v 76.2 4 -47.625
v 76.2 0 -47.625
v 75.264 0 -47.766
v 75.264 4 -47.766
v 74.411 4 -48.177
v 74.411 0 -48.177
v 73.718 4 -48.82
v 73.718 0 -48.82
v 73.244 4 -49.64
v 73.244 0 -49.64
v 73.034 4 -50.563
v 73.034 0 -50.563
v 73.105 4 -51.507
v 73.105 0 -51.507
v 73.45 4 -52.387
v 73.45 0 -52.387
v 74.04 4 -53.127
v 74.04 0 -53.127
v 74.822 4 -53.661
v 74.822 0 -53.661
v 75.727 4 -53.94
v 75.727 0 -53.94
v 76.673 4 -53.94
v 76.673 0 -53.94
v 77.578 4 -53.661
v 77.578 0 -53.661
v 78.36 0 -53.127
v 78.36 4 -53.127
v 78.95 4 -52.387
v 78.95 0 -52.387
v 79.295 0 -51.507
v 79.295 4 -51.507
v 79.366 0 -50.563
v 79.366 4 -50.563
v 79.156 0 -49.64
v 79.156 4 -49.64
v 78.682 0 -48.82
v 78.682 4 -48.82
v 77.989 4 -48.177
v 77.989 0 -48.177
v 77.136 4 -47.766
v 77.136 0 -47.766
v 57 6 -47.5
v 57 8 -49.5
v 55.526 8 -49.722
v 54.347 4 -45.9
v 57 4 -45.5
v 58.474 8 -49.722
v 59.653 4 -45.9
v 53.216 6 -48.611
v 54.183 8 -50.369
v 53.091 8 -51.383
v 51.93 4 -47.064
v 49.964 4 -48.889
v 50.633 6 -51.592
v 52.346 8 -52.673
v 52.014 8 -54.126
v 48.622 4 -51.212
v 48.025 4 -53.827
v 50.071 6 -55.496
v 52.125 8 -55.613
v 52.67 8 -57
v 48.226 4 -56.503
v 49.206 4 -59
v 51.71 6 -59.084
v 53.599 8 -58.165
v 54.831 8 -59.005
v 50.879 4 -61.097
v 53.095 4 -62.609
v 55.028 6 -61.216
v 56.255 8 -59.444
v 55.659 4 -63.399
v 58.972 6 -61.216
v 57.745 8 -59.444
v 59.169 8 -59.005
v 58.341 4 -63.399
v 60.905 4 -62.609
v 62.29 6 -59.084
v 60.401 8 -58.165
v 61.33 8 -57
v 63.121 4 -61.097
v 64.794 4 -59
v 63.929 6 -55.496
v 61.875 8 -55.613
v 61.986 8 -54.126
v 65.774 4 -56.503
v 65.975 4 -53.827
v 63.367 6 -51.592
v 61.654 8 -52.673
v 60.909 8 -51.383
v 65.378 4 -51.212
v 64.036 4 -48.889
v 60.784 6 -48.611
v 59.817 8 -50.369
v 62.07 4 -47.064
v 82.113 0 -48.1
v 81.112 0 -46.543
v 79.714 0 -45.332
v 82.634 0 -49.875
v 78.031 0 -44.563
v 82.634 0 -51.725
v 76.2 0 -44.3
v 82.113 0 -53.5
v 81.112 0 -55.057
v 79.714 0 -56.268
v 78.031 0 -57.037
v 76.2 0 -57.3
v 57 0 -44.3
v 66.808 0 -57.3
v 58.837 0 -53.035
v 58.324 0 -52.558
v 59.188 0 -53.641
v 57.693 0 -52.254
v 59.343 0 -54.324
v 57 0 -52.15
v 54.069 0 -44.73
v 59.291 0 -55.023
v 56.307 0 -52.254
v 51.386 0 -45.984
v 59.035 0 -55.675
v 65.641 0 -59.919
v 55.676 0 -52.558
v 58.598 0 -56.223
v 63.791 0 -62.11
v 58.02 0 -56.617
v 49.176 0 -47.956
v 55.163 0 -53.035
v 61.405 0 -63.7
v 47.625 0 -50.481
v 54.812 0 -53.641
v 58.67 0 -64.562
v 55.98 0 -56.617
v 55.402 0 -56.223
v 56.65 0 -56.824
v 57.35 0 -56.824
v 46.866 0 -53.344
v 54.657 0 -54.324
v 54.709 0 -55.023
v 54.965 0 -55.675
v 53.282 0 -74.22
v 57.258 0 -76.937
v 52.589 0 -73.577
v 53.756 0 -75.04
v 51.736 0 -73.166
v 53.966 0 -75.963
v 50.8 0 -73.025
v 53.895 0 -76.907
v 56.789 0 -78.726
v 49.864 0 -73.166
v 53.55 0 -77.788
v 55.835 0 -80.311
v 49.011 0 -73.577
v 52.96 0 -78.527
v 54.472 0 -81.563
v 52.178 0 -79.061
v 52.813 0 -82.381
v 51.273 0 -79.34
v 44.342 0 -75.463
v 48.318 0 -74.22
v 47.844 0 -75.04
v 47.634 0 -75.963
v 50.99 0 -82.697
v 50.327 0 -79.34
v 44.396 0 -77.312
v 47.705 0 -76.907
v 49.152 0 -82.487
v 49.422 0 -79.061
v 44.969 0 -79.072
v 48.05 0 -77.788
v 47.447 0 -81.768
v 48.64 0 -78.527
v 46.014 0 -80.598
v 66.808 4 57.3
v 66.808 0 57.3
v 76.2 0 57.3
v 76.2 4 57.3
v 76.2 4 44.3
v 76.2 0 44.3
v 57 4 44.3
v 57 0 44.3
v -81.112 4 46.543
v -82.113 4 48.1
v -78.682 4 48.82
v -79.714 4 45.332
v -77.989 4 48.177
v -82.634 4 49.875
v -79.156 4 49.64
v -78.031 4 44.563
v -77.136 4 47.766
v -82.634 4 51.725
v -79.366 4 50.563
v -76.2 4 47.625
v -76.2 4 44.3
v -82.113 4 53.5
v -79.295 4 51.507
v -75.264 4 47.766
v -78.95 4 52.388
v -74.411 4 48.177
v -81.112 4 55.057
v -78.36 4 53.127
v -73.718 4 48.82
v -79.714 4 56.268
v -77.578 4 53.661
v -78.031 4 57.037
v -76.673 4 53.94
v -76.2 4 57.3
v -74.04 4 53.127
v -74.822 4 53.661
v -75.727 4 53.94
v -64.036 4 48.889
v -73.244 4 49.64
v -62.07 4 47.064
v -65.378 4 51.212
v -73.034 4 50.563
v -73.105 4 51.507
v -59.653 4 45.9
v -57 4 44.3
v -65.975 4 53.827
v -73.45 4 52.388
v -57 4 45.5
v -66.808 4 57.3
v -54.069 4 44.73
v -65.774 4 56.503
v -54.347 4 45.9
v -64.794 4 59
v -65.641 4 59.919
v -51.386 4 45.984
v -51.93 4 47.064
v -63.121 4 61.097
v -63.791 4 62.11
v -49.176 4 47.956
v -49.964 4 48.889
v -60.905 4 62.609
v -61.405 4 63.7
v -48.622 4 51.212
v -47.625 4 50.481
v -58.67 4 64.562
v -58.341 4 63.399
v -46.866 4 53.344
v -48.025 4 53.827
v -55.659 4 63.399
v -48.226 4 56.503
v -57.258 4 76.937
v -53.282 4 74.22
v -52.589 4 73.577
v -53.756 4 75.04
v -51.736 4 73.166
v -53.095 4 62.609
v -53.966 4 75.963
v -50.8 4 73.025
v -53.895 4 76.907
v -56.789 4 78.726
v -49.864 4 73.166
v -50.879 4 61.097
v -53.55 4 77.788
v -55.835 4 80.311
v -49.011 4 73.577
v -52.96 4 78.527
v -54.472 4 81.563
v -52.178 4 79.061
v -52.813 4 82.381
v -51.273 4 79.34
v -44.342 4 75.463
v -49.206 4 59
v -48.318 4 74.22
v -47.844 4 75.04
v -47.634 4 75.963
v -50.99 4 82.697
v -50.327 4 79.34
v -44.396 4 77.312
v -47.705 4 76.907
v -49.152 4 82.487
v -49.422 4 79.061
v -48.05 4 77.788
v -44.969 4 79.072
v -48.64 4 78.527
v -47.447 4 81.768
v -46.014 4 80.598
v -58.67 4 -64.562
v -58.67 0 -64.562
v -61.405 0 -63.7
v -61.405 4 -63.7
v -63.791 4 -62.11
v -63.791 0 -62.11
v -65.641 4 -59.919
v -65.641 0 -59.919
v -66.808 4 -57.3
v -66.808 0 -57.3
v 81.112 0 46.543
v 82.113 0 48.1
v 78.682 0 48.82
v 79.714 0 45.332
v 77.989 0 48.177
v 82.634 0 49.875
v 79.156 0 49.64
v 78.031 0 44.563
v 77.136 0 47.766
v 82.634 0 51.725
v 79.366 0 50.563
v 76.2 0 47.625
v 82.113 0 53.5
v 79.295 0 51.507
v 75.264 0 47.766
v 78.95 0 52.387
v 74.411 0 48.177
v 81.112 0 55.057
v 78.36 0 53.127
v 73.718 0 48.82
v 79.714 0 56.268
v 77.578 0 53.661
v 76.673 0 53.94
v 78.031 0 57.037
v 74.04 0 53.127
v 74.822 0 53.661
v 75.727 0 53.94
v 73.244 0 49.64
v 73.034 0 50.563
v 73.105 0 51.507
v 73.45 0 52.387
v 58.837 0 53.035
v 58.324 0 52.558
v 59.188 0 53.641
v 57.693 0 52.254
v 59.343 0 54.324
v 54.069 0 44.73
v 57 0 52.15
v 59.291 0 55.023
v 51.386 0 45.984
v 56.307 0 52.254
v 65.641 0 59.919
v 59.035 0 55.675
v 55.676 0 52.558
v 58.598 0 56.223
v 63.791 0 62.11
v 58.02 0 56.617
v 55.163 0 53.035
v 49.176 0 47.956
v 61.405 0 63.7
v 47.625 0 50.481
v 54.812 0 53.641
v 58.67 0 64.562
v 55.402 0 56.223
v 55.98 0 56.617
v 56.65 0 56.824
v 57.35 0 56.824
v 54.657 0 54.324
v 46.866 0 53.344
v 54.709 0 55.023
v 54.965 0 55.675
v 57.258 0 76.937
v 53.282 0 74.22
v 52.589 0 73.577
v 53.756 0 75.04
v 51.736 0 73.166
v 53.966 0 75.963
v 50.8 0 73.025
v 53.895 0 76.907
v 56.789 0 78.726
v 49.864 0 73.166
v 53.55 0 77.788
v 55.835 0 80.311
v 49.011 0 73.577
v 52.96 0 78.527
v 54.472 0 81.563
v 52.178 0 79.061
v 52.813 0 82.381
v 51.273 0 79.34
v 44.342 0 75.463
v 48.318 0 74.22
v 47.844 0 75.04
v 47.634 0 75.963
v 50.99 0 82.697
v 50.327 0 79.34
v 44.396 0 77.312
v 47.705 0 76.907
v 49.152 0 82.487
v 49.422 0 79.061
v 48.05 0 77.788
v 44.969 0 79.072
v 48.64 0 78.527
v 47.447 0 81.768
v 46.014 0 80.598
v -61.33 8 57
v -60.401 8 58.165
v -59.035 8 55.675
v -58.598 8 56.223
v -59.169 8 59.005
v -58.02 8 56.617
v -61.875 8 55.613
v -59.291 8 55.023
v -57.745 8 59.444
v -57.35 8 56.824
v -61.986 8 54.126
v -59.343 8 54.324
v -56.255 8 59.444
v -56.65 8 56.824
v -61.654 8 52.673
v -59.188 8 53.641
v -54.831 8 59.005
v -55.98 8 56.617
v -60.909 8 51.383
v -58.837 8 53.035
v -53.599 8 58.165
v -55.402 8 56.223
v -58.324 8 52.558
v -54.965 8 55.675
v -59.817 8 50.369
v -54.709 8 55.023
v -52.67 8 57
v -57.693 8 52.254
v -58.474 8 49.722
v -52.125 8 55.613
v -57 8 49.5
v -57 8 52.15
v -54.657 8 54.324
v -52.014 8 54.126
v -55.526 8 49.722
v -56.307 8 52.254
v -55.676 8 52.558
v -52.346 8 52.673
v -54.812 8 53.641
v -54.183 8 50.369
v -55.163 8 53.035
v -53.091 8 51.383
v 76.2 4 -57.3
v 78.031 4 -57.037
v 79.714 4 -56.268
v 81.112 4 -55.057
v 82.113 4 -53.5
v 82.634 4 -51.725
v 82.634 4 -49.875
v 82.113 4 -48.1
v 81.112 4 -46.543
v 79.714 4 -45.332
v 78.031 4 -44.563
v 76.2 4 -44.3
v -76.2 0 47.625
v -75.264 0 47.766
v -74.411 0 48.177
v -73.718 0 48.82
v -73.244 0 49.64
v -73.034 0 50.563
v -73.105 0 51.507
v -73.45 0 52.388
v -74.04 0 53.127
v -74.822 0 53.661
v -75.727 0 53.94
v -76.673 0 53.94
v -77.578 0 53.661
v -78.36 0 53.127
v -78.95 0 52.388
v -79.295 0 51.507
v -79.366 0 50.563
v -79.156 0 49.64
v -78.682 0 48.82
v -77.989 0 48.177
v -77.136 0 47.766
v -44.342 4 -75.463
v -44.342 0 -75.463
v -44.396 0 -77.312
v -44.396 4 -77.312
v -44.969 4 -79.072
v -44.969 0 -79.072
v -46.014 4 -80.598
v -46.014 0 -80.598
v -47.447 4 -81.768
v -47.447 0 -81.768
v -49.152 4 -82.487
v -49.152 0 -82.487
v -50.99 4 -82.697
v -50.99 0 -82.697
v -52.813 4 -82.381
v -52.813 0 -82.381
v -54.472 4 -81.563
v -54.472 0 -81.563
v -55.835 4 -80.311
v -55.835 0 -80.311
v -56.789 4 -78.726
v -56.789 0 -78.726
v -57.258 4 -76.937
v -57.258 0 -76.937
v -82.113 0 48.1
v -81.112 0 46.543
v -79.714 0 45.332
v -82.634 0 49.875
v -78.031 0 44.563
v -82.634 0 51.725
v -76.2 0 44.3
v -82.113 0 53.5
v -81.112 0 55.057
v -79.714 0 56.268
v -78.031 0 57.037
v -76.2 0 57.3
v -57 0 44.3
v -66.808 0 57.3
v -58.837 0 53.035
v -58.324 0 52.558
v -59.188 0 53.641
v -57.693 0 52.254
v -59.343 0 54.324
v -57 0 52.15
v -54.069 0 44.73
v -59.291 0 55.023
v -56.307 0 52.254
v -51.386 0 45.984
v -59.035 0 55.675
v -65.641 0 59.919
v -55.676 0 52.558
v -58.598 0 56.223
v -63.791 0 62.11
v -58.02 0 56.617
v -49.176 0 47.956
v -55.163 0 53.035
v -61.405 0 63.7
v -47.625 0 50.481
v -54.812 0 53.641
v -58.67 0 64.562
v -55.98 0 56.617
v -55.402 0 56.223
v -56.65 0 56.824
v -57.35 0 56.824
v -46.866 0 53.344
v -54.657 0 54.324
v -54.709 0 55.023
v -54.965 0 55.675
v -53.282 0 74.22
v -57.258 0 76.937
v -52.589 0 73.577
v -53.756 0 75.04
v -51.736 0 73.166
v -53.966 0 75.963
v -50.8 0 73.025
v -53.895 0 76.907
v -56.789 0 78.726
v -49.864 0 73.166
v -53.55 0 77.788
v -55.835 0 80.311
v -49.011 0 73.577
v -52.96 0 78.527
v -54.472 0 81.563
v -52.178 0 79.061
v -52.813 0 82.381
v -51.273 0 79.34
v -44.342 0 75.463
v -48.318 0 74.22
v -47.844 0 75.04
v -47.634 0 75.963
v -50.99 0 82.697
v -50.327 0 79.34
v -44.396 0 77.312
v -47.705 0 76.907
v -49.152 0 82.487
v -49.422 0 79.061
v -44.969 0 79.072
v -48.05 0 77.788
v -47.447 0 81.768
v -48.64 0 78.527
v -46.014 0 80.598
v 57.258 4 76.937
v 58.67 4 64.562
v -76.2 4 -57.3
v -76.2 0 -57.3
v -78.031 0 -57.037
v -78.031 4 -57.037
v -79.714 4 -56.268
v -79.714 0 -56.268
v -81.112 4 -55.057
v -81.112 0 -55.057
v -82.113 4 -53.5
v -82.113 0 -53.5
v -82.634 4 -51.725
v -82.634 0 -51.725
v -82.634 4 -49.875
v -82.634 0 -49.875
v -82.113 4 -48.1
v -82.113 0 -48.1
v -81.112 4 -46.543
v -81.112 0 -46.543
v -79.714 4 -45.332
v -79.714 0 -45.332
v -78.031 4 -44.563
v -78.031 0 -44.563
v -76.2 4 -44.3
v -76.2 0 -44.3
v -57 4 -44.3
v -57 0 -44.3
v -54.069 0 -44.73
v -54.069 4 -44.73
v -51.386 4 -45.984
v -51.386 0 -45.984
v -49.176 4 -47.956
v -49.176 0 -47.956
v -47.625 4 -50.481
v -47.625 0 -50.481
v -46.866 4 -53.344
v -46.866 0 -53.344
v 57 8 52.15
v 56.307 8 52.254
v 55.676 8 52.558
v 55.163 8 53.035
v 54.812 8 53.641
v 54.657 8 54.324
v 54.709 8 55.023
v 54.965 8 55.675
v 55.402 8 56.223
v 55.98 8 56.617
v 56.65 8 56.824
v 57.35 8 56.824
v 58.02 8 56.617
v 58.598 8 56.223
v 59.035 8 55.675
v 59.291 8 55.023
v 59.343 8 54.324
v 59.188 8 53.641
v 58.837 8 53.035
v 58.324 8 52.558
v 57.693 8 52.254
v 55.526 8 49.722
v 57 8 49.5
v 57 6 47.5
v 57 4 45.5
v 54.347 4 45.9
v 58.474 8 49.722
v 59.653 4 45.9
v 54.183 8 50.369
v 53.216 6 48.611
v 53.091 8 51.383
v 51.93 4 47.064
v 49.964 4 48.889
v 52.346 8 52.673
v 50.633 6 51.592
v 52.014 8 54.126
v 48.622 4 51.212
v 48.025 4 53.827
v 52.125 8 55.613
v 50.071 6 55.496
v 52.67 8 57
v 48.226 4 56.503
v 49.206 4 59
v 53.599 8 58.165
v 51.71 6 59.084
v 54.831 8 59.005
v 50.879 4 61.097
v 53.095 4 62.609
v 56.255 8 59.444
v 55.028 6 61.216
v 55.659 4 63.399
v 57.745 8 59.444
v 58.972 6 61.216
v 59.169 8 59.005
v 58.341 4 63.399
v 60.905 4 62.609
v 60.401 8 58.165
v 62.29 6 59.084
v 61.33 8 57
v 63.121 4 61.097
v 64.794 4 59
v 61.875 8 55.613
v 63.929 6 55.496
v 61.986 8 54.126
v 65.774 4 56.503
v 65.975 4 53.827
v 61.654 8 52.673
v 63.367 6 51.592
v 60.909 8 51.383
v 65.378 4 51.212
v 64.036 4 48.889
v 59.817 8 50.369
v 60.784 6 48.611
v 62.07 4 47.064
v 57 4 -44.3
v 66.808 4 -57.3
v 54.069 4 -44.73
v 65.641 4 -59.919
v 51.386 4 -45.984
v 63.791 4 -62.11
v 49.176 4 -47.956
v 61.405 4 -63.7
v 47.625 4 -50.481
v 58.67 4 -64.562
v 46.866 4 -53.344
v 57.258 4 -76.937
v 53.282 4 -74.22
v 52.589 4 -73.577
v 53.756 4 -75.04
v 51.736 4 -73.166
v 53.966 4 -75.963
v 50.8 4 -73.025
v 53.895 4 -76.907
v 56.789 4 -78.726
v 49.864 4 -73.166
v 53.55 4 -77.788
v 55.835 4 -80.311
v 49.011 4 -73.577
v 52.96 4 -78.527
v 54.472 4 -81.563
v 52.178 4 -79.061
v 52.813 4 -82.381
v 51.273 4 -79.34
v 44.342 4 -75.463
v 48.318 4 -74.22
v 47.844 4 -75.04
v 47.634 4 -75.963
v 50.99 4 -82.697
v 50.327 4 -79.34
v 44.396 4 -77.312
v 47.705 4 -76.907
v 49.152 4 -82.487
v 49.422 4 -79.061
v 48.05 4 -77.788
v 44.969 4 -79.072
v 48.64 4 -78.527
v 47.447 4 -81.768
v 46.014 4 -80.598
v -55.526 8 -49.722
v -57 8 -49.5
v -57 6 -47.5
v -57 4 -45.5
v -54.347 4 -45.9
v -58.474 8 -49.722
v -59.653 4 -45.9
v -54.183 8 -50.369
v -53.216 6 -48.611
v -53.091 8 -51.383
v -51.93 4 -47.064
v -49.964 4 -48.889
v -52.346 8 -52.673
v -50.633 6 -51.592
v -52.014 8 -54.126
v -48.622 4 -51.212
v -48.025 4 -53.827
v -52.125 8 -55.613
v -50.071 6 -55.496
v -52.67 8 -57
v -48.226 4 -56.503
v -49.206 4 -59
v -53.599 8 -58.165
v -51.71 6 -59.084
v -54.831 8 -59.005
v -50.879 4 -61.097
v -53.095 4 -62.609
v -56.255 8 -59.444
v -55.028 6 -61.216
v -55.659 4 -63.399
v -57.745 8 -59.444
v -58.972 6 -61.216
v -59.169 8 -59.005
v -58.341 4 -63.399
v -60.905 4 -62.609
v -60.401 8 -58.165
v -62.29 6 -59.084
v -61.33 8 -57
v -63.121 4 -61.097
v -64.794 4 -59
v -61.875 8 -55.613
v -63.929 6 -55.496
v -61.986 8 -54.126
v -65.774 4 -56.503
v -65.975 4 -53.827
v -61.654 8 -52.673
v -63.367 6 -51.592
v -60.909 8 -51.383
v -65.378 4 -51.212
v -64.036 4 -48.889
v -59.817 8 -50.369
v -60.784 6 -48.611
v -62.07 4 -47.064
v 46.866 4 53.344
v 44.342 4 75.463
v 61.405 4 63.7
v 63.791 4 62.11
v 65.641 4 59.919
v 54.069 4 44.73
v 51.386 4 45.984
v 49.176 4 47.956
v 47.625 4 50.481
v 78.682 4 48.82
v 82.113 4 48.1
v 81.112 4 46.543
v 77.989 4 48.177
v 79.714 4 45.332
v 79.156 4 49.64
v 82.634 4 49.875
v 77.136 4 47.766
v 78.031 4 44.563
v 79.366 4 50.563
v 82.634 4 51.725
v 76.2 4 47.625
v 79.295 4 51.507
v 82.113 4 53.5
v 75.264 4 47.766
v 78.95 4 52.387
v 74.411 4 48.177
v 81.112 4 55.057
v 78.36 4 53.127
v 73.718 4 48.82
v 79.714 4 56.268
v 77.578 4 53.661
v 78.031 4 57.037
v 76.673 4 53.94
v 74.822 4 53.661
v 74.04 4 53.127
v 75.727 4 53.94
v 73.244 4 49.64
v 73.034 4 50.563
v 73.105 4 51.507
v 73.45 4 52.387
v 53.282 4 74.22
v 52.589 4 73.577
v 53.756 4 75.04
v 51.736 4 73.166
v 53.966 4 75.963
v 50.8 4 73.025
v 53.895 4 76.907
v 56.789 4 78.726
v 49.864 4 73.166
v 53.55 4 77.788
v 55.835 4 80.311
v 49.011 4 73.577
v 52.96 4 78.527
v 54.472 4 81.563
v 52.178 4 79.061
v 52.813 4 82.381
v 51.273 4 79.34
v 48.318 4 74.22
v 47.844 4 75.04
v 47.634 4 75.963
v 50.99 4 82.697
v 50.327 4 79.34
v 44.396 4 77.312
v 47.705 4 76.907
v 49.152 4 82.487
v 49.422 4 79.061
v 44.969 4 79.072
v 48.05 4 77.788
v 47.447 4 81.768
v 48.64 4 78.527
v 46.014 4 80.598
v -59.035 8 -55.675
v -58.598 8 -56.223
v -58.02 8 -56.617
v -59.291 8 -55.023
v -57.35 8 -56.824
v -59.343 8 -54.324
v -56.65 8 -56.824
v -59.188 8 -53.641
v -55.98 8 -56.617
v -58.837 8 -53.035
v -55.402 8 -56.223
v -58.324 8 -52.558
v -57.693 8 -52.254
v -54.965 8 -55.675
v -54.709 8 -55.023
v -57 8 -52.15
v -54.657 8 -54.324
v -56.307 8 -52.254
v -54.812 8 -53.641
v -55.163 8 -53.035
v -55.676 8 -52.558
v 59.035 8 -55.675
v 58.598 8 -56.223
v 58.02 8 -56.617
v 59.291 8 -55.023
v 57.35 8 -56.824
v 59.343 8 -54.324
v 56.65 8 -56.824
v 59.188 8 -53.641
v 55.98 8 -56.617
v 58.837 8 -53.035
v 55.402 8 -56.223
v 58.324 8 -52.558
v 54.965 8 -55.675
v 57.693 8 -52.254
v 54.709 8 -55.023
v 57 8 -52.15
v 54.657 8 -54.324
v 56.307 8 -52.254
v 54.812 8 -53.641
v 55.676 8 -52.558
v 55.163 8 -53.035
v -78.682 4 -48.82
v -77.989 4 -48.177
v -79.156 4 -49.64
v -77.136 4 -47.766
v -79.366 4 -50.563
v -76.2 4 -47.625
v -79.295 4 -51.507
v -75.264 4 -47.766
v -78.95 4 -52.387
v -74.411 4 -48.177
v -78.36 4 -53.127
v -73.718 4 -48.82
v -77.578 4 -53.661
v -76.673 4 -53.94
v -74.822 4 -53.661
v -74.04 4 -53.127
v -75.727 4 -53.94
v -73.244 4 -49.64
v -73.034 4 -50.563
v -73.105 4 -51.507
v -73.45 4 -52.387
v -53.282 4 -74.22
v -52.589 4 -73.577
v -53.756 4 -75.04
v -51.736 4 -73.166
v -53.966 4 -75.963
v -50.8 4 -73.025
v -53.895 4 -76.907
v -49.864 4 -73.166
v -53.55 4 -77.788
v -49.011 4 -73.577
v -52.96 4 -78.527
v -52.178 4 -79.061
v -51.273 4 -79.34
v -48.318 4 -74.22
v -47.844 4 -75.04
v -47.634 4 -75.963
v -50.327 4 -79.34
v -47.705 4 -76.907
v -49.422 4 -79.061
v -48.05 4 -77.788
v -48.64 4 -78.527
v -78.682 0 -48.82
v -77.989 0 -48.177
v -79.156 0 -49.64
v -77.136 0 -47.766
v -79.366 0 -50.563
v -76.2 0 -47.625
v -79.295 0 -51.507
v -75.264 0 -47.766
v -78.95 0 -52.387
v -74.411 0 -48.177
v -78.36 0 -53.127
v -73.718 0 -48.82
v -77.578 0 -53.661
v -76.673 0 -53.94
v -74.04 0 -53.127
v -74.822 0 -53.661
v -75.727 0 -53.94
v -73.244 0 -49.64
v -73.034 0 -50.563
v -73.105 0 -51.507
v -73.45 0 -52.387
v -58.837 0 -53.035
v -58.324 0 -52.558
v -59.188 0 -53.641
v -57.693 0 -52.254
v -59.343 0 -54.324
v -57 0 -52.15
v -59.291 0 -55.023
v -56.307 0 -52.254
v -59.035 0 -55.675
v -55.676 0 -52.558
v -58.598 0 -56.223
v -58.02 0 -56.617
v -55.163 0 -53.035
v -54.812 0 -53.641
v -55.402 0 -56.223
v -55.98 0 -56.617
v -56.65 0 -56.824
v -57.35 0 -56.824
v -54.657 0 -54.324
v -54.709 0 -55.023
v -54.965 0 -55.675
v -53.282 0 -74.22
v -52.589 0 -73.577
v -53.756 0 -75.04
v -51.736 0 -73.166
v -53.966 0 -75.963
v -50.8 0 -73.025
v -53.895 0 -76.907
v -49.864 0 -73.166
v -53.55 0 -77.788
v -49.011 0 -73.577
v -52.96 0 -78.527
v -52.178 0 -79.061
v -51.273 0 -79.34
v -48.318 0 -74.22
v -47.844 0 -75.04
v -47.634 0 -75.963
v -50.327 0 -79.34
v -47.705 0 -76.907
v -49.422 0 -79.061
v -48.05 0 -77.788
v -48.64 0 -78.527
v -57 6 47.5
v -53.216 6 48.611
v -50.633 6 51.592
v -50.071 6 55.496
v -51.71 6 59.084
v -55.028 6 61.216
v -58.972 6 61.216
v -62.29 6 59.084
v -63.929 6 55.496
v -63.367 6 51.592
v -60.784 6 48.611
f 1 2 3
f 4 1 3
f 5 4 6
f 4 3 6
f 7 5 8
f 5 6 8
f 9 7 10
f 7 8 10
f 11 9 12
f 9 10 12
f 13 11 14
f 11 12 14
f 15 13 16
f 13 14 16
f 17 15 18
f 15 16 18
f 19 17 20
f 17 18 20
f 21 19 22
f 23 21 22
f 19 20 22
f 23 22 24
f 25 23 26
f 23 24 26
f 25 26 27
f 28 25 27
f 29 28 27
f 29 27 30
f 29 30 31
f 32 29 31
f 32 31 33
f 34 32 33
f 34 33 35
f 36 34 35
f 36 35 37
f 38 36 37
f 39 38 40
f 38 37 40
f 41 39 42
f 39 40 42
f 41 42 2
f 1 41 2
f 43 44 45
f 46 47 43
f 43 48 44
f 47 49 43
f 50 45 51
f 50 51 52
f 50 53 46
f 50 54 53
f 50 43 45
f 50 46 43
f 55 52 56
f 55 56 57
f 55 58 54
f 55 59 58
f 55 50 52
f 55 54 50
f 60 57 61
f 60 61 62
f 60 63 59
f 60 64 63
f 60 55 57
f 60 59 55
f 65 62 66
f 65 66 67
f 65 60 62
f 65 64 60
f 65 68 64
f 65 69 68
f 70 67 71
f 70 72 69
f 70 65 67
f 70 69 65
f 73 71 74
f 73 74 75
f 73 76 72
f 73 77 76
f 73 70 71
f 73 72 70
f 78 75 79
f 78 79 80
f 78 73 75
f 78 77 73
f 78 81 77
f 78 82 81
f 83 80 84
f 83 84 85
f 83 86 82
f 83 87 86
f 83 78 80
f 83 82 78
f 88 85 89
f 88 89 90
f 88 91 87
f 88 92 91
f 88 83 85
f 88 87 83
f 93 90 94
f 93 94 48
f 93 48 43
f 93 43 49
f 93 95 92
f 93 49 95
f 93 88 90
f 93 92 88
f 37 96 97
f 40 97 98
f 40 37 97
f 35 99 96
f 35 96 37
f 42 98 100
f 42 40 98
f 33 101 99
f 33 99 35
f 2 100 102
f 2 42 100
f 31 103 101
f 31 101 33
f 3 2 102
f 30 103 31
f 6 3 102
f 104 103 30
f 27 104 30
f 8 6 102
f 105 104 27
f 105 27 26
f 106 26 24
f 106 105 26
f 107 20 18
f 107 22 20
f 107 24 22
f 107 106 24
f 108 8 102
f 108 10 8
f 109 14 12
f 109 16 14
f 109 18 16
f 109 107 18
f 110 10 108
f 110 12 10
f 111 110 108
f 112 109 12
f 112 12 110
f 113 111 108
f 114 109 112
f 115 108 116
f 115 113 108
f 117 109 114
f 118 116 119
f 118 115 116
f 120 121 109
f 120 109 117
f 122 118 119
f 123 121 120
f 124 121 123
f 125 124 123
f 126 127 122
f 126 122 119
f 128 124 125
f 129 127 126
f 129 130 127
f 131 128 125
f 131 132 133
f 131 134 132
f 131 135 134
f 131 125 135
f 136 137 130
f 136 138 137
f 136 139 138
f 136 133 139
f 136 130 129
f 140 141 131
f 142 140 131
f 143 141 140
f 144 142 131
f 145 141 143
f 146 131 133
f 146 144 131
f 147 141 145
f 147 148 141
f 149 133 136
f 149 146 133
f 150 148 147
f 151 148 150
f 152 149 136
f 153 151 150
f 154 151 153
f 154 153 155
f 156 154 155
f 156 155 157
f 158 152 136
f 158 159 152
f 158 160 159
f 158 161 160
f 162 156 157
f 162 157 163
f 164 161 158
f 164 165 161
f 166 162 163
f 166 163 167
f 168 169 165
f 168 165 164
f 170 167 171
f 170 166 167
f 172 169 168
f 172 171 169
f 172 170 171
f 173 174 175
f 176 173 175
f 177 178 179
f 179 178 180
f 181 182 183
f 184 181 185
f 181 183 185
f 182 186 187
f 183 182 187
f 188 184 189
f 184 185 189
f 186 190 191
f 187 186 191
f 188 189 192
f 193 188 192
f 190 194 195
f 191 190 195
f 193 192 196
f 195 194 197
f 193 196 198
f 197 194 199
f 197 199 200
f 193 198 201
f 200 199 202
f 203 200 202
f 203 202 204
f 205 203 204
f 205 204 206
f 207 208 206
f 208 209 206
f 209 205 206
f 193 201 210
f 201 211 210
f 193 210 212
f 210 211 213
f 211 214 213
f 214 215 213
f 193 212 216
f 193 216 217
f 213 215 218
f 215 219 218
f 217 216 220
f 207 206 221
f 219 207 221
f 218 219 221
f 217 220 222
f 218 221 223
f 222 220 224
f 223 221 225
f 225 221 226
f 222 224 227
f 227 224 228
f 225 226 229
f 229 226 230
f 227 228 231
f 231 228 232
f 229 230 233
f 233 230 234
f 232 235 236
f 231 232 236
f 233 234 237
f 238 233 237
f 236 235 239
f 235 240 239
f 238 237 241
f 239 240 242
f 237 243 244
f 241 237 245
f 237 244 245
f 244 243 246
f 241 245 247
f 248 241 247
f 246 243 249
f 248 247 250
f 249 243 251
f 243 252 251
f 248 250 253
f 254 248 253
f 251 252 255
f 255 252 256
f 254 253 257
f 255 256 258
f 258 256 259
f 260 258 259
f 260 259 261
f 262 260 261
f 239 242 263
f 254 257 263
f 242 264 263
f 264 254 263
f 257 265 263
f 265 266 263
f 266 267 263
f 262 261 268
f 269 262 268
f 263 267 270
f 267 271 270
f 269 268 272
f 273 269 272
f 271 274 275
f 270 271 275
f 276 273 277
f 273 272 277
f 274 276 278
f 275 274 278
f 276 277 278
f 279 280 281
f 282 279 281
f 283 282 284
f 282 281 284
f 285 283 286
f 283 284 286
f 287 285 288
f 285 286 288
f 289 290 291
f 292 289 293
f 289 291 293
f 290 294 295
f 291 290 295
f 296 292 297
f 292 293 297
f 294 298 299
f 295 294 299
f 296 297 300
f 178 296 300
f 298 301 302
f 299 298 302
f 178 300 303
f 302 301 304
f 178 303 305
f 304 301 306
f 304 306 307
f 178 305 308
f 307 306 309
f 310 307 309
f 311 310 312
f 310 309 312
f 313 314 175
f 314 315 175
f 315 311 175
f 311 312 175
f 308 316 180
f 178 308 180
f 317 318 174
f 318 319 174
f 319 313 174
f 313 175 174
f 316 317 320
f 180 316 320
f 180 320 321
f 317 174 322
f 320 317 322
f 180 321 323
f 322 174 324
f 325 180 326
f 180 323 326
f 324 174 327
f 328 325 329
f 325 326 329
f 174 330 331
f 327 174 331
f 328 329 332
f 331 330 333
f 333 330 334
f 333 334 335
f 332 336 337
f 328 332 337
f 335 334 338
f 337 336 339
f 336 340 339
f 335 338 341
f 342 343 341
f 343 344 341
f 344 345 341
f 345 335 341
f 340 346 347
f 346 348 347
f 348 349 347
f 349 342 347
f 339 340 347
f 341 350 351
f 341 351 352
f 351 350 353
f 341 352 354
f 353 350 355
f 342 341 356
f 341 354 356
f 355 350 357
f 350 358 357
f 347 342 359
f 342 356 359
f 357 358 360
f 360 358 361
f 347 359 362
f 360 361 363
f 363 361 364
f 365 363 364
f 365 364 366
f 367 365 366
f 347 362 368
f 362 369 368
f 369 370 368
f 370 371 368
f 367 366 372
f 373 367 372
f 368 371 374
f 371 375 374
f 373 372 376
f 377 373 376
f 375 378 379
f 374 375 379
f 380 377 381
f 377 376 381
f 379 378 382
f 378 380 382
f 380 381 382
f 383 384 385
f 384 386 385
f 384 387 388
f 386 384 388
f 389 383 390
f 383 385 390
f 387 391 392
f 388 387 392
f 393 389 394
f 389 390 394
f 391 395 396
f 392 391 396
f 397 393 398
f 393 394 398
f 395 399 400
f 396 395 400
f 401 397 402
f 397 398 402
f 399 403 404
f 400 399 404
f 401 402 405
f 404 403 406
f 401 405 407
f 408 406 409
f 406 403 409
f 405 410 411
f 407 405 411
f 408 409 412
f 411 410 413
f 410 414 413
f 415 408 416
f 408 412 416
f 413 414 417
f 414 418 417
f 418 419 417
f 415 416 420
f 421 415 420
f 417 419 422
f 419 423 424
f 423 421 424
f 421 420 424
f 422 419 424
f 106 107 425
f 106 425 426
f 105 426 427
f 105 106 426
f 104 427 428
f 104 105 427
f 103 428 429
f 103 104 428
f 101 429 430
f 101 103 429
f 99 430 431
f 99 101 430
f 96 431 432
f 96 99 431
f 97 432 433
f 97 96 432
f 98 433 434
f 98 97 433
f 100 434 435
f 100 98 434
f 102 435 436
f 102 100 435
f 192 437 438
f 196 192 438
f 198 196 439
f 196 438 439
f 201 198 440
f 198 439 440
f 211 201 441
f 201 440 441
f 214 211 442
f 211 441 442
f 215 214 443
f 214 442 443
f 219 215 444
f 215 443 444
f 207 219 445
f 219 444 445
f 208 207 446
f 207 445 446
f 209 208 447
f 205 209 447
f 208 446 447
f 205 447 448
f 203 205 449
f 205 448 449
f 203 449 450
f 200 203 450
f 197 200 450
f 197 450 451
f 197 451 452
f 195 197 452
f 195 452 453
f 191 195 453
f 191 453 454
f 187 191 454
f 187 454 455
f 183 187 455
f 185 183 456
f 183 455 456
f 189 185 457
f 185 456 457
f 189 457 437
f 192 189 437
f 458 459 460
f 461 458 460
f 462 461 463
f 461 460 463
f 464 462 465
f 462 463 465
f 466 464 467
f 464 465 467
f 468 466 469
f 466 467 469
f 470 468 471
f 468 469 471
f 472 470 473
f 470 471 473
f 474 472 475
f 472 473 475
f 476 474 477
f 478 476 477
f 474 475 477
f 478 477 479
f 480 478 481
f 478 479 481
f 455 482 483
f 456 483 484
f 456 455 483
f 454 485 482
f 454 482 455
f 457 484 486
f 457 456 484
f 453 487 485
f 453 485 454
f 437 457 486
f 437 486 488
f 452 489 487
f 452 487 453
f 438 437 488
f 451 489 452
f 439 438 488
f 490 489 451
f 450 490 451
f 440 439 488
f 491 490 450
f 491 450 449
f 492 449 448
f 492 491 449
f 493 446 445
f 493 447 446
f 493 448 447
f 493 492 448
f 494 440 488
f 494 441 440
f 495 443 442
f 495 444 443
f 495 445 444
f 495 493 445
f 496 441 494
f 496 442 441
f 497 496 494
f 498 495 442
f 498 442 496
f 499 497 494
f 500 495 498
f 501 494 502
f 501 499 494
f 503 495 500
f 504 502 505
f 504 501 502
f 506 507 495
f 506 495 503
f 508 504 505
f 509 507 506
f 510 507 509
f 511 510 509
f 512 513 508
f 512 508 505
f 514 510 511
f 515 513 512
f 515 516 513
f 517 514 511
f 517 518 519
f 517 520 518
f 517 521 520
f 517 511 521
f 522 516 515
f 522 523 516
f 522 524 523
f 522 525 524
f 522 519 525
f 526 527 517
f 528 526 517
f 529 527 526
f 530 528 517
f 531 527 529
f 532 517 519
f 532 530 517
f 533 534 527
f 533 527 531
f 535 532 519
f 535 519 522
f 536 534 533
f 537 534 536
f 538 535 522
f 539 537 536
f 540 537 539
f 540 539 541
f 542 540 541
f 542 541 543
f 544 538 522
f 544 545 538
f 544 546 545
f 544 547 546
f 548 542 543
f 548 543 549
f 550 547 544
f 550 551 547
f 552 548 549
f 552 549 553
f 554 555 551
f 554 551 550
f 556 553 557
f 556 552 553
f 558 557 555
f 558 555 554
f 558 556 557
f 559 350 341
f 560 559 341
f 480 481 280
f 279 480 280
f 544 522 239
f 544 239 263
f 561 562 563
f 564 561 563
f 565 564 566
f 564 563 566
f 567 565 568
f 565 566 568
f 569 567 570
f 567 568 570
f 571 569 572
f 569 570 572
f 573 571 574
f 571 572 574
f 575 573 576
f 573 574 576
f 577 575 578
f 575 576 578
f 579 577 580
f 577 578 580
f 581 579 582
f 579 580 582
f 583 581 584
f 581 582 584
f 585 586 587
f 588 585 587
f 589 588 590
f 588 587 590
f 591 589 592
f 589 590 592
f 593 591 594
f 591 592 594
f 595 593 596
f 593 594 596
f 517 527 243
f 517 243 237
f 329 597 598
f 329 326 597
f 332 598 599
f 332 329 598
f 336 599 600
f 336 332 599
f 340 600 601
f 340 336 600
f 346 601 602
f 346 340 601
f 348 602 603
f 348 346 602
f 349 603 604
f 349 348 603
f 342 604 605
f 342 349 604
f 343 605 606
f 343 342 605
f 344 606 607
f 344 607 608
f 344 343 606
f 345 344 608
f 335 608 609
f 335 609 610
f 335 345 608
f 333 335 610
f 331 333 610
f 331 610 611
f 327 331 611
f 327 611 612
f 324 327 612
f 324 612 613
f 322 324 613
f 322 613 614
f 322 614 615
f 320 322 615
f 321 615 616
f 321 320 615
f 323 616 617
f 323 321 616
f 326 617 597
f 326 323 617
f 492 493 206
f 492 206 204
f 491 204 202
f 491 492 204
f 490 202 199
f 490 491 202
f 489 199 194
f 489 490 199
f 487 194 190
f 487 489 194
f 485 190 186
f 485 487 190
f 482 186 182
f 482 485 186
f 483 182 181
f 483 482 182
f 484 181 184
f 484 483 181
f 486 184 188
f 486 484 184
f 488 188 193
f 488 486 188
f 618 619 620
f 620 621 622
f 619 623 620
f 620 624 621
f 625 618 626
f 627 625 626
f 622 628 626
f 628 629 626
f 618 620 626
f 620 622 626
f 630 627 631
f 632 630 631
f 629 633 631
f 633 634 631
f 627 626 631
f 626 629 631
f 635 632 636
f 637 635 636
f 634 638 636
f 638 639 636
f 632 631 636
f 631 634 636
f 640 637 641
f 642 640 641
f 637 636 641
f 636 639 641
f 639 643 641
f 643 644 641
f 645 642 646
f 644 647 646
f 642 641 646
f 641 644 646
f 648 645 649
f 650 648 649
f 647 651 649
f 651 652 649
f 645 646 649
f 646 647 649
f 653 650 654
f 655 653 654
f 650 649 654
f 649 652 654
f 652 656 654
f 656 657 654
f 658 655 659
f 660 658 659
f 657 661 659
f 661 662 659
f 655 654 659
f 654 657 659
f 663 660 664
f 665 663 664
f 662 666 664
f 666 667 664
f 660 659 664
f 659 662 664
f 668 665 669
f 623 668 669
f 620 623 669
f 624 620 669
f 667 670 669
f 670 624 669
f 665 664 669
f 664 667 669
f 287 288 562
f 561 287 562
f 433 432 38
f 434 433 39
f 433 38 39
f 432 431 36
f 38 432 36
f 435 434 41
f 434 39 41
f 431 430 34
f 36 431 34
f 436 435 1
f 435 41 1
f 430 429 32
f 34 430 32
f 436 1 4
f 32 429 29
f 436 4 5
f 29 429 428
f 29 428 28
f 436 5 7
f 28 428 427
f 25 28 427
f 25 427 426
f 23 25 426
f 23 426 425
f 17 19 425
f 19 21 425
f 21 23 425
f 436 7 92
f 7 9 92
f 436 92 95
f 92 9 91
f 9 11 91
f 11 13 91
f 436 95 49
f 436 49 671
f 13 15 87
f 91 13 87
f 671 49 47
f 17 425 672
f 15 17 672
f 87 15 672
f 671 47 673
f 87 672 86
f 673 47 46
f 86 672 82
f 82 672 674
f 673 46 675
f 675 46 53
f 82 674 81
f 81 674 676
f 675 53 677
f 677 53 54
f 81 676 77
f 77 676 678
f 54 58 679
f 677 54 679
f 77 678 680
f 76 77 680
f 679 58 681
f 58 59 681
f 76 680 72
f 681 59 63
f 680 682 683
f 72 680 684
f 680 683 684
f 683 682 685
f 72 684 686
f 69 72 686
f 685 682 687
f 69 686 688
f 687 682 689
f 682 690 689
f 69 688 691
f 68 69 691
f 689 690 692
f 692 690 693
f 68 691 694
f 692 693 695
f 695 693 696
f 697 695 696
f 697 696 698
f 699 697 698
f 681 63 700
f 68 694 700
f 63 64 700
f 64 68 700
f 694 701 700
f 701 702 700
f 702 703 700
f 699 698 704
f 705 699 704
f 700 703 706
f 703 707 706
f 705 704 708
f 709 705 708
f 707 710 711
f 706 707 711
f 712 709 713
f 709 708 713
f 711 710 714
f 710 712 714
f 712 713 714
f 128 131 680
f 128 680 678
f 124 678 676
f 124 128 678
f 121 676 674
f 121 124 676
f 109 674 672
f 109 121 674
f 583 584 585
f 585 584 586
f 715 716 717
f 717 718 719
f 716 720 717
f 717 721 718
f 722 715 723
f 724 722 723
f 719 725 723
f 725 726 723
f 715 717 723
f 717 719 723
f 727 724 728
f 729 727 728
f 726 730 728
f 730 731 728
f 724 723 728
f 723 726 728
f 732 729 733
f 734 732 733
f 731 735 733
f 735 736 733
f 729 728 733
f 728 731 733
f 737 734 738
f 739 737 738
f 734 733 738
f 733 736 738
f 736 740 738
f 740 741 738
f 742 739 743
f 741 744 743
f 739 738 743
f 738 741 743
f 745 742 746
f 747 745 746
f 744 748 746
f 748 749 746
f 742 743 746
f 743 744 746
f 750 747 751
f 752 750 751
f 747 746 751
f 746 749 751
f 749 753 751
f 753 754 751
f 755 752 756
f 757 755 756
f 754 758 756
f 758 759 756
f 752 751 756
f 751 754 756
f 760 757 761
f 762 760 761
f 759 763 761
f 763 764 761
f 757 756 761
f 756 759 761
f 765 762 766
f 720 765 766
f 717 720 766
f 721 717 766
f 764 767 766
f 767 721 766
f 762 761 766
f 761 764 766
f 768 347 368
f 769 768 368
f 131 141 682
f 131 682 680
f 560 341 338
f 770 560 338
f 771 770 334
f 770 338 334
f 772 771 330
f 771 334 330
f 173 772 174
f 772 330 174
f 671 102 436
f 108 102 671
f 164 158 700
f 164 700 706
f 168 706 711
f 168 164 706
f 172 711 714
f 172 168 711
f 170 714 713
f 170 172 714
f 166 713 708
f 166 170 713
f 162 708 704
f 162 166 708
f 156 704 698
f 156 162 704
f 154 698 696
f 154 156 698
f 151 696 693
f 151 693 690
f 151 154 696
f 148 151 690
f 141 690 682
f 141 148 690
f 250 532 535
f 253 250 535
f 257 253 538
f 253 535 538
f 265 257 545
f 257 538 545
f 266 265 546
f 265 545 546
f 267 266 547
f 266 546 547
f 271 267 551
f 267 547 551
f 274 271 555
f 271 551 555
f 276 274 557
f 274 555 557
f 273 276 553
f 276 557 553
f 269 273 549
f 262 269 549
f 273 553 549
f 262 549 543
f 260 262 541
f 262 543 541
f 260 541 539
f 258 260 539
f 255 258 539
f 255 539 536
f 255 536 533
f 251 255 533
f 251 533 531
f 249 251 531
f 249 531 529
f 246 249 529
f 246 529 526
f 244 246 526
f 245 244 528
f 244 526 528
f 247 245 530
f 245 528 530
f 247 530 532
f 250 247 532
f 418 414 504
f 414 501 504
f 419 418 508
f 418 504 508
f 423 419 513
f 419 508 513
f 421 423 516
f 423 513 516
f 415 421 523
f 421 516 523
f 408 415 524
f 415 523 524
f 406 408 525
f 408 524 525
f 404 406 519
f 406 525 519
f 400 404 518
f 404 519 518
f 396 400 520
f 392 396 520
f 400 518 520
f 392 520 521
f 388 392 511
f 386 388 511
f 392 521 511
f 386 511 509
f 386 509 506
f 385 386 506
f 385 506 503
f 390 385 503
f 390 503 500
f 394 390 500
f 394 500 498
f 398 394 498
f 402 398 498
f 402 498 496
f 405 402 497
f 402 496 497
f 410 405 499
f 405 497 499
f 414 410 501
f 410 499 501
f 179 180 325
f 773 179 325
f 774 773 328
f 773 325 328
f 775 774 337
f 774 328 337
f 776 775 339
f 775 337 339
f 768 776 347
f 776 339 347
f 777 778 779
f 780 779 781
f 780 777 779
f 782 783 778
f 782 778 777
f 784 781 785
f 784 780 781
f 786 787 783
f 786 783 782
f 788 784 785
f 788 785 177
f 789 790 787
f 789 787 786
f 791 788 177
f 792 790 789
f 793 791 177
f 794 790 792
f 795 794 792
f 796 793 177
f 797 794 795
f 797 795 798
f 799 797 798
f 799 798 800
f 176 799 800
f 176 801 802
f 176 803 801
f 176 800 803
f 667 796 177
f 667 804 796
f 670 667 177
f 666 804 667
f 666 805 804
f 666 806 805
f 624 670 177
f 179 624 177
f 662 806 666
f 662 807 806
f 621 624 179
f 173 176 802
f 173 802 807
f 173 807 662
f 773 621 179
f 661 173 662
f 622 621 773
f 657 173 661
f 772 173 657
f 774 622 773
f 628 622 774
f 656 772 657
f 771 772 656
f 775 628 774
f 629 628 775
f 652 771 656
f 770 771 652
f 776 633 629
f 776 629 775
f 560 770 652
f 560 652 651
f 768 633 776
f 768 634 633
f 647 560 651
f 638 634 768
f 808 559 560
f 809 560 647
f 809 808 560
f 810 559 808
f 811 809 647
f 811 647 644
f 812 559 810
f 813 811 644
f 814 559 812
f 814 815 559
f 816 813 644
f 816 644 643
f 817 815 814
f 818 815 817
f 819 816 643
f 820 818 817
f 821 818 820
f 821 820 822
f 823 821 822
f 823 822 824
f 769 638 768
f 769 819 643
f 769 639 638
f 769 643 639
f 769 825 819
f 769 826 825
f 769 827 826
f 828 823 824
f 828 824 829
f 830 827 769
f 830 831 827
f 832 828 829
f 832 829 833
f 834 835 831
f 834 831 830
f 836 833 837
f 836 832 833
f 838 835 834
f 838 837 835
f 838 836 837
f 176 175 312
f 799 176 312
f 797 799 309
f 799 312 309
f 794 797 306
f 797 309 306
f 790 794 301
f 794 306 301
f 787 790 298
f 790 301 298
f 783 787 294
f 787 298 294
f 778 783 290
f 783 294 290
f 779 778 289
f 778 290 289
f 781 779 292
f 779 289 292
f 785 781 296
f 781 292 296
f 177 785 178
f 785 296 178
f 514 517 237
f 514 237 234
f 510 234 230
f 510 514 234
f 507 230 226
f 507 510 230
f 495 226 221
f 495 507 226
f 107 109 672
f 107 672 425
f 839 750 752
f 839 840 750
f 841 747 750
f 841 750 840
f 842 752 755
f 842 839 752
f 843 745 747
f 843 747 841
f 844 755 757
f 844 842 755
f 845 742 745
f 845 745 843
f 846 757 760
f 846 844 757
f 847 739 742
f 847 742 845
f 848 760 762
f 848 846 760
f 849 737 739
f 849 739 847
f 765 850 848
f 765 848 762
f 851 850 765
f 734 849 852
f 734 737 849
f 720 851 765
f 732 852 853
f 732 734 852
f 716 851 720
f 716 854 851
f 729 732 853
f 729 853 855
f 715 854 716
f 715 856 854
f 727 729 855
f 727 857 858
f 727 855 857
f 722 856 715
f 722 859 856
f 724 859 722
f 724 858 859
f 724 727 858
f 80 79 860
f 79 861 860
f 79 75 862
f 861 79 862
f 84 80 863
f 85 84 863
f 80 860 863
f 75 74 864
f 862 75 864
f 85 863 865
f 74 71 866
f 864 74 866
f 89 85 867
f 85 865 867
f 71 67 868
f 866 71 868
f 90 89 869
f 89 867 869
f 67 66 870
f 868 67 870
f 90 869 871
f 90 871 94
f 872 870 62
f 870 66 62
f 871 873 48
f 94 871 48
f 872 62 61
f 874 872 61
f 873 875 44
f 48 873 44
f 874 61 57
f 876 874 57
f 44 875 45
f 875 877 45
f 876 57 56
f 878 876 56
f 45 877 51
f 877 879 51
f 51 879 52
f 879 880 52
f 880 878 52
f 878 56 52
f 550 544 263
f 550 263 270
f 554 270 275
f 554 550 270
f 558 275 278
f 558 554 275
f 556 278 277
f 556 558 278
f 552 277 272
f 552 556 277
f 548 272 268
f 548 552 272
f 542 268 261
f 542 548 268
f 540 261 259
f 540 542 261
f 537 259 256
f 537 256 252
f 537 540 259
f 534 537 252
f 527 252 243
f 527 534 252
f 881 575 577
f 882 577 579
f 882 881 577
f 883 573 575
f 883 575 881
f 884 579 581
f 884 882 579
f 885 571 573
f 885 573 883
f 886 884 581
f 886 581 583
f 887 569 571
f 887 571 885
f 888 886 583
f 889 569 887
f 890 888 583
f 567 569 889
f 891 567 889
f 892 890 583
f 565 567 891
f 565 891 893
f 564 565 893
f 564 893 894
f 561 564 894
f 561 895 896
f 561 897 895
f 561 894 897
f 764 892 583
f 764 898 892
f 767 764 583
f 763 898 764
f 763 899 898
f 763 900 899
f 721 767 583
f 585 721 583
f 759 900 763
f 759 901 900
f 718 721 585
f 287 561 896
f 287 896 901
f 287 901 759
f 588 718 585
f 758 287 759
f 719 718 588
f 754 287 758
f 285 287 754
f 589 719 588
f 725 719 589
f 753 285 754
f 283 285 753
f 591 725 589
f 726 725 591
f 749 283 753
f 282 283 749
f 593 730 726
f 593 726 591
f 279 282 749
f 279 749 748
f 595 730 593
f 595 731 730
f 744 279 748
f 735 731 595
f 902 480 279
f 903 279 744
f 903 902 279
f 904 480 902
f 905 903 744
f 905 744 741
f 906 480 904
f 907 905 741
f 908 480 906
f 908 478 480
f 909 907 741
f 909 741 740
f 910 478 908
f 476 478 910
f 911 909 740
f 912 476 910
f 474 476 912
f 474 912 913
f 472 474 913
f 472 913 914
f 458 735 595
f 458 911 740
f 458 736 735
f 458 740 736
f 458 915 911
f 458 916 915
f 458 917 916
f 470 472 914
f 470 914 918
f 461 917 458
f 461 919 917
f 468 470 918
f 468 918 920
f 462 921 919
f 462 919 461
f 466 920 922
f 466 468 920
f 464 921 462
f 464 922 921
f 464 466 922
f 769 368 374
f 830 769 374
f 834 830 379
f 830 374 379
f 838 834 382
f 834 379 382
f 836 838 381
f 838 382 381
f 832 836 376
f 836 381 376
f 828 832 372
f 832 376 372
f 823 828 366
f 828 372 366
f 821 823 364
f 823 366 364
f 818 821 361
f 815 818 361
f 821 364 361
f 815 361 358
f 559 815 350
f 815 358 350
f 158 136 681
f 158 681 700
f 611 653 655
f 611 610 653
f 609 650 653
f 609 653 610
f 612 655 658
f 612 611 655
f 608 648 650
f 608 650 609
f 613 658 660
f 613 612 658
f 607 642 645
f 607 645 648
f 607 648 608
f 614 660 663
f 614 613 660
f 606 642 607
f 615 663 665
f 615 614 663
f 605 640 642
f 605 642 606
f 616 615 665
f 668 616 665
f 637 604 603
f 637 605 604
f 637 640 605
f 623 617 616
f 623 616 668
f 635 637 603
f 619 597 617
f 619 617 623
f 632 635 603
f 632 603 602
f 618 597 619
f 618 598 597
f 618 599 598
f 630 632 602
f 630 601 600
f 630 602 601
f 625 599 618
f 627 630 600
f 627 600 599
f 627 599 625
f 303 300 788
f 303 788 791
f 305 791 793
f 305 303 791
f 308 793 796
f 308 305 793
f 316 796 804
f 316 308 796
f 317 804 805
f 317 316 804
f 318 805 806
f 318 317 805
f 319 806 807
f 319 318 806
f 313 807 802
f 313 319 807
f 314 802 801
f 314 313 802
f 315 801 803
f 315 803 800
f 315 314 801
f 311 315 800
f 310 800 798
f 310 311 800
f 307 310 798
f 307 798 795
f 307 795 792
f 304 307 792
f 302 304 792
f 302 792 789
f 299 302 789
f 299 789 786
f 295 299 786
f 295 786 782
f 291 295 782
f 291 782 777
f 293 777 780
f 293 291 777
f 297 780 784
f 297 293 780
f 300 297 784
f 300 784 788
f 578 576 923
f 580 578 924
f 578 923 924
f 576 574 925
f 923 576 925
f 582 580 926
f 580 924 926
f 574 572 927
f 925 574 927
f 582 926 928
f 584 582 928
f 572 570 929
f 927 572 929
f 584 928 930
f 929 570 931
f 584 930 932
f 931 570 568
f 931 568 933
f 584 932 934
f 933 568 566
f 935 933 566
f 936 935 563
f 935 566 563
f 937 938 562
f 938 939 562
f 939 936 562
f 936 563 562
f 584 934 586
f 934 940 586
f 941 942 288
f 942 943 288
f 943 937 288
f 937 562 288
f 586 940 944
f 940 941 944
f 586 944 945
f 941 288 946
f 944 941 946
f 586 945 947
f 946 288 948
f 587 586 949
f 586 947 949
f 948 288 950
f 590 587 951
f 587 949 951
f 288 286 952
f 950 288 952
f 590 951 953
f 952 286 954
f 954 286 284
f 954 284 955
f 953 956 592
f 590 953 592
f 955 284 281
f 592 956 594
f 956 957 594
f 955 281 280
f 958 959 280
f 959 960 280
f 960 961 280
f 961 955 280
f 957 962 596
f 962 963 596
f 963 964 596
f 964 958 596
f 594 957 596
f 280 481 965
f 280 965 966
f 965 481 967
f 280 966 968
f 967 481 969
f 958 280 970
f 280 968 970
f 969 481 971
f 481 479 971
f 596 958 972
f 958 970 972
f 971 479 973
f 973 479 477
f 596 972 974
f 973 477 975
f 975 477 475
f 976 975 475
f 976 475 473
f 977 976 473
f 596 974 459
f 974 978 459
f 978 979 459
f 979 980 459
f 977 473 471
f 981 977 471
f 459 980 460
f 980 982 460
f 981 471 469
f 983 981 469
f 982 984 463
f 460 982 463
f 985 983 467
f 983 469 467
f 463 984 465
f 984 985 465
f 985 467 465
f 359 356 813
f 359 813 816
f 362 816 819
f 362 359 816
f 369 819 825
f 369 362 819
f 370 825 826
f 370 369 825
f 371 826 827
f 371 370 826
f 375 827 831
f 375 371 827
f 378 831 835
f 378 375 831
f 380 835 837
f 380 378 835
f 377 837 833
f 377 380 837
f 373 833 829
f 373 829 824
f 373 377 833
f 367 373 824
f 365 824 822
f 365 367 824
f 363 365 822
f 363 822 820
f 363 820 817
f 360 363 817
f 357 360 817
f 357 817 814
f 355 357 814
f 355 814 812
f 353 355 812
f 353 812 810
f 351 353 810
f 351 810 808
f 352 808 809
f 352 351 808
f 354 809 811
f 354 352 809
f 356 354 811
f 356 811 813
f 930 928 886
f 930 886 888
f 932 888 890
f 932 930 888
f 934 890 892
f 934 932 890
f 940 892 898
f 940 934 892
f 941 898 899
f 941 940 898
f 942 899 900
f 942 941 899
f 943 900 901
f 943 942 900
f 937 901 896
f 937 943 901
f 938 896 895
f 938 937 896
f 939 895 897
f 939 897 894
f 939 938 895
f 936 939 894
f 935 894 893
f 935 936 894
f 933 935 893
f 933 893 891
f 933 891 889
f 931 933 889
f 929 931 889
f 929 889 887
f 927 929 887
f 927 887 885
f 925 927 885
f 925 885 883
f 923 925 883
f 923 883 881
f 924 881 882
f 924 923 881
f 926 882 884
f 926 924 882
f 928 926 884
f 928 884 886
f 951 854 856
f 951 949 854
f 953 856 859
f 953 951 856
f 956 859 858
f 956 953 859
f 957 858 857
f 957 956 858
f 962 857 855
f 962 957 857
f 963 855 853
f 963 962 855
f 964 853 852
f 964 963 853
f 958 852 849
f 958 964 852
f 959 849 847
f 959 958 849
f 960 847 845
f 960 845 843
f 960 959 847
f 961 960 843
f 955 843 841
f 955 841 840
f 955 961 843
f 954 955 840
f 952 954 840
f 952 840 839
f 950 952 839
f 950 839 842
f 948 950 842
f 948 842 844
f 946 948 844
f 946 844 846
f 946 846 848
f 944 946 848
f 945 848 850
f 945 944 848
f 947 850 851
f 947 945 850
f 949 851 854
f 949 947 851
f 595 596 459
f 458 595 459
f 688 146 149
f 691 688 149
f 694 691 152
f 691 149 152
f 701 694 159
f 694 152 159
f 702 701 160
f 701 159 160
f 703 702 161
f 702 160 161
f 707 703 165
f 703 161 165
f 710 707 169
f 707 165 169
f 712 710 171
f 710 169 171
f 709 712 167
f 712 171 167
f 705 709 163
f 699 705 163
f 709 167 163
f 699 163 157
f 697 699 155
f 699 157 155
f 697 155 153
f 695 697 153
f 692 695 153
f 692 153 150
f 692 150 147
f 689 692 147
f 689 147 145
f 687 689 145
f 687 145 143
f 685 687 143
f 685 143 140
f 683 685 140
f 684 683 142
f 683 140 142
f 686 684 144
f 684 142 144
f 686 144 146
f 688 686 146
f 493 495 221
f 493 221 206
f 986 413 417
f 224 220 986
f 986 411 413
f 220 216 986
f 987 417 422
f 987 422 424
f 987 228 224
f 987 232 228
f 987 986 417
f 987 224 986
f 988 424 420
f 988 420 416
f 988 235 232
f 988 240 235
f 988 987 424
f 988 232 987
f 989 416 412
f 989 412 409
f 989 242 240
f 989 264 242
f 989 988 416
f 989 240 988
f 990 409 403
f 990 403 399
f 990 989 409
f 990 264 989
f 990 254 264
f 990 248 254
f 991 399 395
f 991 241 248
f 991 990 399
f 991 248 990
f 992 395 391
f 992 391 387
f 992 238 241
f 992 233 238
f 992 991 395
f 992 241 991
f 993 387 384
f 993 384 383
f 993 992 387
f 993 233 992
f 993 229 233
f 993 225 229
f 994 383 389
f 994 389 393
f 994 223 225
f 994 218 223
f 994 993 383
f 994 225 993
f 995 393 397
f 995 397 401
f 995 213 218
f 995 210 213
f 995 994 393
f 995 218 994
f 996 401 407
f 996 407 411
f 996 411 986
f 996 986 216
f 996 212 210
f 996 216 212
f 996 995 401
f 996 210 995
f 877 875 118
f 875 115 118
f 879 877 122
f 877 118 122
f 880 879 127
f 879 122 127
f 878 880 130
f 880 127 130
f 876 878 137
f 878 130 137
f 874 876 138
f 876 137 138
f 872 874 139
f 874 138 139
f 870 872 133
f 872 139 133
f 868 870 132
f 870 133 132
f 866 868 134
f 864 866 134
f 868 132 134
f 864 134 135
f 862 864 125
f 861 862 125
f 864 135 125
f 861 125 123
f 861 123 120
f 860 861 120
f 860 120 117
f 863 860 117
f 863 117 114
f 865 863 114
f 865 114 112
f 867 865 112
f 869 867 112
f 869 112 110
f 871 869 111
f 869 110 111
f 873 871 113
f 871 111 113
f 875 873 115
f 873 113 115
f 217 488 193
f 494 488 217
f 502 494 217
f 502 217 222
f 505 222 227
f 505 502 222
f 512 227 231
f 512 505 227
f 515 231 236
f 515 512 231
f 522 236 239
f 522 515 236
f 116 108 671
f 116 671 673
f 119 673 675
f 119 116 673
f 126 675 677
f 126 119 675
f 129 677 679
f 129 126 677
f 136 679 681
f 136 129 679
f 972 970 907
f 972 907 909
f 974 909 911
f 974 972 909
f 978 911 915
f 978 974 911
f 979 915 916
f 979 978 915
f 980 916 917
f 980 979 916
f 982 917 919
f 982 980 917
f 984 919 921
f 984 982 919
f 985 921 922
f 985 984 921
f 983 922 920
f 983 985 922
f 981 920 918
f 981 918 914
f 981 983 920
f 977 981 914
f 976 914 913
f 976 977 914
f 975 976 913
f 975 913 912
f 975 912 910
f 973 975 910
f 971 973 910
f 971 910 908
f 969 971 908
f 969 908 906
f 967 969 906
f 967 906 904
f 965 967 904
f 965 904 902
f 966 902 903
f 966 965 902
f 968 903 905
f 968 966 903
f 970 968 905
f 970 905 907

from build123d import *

# Parameters (mm, degrees)
SKETCH3_R           = 2.35
SKETCH3_R_2         = 3.175
BOSS_EXTRUDE1_DEPTH = 4
SKETCH4_R           = 5
SKETCH4_R_2         = 2.35
BOSS_EXTRUDE2_DEPTH = 4
CHAMFER1_SIZE       = 4


with BuildPart() as part:
    # Sketch3 → Boss-Extrude1 (new body)
    with BuildSketch(Plane(origin=(0, 0, 0), x_dir=(1, 0, 0), z_dir=(0, 1, 0))):
        with BuildLine():
            Line((-66.808159868, 57.3), (-76.2, 57.3))
            ThreePointArc((-76.2, 57.3), (-82.7, 50.8), (-76.2, 44.3))
            Line((-76.2, 44.3), (-57, 44.3))
            ThreePointArc((-57, 44.3), (-50.208628415, 46.889660192), (-46.865755779, 53.343672158))
            Line((-46.865755779, 53.343672158), (-44.341903193, 75.463124415))
            ThreePointArc((-44.341903193, 75.463124415), (-50.063124415, 82.658096807), (-57.258096807, 76.936875585))
            Line((-57.258096807, 76.936875585), (-58.670042695, 64.562353472))
            ThreePointArc((-58.670042695, 64.562353472), (-63.791371585, 62.110339808), (-66.808159868, 57.3))
        make_face()
        with Locations(Location((-57, 54.5, 0), (0, 0, 270))):
            Circle(SKETCH3_R, mode=Mode.SUBTRACT)
        with Locations(Location((-50.8, 76.2, 0), (0, 0, 270))):
            Circle(SKETCH3_R_2, mode=Mode.SUBTRACT)
        with Locations(Location((-76.2, 50.8, 0), (0, 0, 270))):
            Circle(SKETCH3_R_2, mode=Mode.SUBTRACT)
    extrude(amount=BOSS_EXTRUDE1_DEPTH)

    # Sketch4 → Boss-Extrude2 (add)
    with BuildSketch(Plane(origin=(0, 4, 0), x_dir=(1, 0, 0), z_dir=(0, 1, 0))):
        with Locations(Location((-57, 54.5, 0), (0, 0, 270))):
            Circle(SKETCH4_R)
        with Locations(Location((-57, 54.5, 0), (0, 0, 270))):
            Circle(SKETCH4_R_2, mode=Mode.SUBTRACT)
    extrude(amount=BOSS_EXTRUDE2_DEPTH)

    # Chamfer1
    chamfer1_edges = [part.edges().sort_by_distance(p)[0] for p in [
        (-57, 4, -59.5),
    ]]
    chamfer(chamfer1_edges, length=CHAMFER1_SIZE - 0.0001)  # a hair under: the kernel refuses the full size


with BuildPart() as body_2:
    # Mirror2: mirrored copy
    add(part.part.mirror(Plane(origin=(0, 0, 0), x_dir=(0, 0, 1), z_dir=(1, 0, 0))))


with BuildPart() as body_3:
    # Mirror3: mirrored copy
    add(part.part.mirror(Plane.XY))


with BuildPart() as body_4:
    # Mirror3 2: mirrored copy
    add(body_2.part.mirror(Plane.XY))


solid = Compound([part.part, body_2.part, body_3.part, body_4.part])
